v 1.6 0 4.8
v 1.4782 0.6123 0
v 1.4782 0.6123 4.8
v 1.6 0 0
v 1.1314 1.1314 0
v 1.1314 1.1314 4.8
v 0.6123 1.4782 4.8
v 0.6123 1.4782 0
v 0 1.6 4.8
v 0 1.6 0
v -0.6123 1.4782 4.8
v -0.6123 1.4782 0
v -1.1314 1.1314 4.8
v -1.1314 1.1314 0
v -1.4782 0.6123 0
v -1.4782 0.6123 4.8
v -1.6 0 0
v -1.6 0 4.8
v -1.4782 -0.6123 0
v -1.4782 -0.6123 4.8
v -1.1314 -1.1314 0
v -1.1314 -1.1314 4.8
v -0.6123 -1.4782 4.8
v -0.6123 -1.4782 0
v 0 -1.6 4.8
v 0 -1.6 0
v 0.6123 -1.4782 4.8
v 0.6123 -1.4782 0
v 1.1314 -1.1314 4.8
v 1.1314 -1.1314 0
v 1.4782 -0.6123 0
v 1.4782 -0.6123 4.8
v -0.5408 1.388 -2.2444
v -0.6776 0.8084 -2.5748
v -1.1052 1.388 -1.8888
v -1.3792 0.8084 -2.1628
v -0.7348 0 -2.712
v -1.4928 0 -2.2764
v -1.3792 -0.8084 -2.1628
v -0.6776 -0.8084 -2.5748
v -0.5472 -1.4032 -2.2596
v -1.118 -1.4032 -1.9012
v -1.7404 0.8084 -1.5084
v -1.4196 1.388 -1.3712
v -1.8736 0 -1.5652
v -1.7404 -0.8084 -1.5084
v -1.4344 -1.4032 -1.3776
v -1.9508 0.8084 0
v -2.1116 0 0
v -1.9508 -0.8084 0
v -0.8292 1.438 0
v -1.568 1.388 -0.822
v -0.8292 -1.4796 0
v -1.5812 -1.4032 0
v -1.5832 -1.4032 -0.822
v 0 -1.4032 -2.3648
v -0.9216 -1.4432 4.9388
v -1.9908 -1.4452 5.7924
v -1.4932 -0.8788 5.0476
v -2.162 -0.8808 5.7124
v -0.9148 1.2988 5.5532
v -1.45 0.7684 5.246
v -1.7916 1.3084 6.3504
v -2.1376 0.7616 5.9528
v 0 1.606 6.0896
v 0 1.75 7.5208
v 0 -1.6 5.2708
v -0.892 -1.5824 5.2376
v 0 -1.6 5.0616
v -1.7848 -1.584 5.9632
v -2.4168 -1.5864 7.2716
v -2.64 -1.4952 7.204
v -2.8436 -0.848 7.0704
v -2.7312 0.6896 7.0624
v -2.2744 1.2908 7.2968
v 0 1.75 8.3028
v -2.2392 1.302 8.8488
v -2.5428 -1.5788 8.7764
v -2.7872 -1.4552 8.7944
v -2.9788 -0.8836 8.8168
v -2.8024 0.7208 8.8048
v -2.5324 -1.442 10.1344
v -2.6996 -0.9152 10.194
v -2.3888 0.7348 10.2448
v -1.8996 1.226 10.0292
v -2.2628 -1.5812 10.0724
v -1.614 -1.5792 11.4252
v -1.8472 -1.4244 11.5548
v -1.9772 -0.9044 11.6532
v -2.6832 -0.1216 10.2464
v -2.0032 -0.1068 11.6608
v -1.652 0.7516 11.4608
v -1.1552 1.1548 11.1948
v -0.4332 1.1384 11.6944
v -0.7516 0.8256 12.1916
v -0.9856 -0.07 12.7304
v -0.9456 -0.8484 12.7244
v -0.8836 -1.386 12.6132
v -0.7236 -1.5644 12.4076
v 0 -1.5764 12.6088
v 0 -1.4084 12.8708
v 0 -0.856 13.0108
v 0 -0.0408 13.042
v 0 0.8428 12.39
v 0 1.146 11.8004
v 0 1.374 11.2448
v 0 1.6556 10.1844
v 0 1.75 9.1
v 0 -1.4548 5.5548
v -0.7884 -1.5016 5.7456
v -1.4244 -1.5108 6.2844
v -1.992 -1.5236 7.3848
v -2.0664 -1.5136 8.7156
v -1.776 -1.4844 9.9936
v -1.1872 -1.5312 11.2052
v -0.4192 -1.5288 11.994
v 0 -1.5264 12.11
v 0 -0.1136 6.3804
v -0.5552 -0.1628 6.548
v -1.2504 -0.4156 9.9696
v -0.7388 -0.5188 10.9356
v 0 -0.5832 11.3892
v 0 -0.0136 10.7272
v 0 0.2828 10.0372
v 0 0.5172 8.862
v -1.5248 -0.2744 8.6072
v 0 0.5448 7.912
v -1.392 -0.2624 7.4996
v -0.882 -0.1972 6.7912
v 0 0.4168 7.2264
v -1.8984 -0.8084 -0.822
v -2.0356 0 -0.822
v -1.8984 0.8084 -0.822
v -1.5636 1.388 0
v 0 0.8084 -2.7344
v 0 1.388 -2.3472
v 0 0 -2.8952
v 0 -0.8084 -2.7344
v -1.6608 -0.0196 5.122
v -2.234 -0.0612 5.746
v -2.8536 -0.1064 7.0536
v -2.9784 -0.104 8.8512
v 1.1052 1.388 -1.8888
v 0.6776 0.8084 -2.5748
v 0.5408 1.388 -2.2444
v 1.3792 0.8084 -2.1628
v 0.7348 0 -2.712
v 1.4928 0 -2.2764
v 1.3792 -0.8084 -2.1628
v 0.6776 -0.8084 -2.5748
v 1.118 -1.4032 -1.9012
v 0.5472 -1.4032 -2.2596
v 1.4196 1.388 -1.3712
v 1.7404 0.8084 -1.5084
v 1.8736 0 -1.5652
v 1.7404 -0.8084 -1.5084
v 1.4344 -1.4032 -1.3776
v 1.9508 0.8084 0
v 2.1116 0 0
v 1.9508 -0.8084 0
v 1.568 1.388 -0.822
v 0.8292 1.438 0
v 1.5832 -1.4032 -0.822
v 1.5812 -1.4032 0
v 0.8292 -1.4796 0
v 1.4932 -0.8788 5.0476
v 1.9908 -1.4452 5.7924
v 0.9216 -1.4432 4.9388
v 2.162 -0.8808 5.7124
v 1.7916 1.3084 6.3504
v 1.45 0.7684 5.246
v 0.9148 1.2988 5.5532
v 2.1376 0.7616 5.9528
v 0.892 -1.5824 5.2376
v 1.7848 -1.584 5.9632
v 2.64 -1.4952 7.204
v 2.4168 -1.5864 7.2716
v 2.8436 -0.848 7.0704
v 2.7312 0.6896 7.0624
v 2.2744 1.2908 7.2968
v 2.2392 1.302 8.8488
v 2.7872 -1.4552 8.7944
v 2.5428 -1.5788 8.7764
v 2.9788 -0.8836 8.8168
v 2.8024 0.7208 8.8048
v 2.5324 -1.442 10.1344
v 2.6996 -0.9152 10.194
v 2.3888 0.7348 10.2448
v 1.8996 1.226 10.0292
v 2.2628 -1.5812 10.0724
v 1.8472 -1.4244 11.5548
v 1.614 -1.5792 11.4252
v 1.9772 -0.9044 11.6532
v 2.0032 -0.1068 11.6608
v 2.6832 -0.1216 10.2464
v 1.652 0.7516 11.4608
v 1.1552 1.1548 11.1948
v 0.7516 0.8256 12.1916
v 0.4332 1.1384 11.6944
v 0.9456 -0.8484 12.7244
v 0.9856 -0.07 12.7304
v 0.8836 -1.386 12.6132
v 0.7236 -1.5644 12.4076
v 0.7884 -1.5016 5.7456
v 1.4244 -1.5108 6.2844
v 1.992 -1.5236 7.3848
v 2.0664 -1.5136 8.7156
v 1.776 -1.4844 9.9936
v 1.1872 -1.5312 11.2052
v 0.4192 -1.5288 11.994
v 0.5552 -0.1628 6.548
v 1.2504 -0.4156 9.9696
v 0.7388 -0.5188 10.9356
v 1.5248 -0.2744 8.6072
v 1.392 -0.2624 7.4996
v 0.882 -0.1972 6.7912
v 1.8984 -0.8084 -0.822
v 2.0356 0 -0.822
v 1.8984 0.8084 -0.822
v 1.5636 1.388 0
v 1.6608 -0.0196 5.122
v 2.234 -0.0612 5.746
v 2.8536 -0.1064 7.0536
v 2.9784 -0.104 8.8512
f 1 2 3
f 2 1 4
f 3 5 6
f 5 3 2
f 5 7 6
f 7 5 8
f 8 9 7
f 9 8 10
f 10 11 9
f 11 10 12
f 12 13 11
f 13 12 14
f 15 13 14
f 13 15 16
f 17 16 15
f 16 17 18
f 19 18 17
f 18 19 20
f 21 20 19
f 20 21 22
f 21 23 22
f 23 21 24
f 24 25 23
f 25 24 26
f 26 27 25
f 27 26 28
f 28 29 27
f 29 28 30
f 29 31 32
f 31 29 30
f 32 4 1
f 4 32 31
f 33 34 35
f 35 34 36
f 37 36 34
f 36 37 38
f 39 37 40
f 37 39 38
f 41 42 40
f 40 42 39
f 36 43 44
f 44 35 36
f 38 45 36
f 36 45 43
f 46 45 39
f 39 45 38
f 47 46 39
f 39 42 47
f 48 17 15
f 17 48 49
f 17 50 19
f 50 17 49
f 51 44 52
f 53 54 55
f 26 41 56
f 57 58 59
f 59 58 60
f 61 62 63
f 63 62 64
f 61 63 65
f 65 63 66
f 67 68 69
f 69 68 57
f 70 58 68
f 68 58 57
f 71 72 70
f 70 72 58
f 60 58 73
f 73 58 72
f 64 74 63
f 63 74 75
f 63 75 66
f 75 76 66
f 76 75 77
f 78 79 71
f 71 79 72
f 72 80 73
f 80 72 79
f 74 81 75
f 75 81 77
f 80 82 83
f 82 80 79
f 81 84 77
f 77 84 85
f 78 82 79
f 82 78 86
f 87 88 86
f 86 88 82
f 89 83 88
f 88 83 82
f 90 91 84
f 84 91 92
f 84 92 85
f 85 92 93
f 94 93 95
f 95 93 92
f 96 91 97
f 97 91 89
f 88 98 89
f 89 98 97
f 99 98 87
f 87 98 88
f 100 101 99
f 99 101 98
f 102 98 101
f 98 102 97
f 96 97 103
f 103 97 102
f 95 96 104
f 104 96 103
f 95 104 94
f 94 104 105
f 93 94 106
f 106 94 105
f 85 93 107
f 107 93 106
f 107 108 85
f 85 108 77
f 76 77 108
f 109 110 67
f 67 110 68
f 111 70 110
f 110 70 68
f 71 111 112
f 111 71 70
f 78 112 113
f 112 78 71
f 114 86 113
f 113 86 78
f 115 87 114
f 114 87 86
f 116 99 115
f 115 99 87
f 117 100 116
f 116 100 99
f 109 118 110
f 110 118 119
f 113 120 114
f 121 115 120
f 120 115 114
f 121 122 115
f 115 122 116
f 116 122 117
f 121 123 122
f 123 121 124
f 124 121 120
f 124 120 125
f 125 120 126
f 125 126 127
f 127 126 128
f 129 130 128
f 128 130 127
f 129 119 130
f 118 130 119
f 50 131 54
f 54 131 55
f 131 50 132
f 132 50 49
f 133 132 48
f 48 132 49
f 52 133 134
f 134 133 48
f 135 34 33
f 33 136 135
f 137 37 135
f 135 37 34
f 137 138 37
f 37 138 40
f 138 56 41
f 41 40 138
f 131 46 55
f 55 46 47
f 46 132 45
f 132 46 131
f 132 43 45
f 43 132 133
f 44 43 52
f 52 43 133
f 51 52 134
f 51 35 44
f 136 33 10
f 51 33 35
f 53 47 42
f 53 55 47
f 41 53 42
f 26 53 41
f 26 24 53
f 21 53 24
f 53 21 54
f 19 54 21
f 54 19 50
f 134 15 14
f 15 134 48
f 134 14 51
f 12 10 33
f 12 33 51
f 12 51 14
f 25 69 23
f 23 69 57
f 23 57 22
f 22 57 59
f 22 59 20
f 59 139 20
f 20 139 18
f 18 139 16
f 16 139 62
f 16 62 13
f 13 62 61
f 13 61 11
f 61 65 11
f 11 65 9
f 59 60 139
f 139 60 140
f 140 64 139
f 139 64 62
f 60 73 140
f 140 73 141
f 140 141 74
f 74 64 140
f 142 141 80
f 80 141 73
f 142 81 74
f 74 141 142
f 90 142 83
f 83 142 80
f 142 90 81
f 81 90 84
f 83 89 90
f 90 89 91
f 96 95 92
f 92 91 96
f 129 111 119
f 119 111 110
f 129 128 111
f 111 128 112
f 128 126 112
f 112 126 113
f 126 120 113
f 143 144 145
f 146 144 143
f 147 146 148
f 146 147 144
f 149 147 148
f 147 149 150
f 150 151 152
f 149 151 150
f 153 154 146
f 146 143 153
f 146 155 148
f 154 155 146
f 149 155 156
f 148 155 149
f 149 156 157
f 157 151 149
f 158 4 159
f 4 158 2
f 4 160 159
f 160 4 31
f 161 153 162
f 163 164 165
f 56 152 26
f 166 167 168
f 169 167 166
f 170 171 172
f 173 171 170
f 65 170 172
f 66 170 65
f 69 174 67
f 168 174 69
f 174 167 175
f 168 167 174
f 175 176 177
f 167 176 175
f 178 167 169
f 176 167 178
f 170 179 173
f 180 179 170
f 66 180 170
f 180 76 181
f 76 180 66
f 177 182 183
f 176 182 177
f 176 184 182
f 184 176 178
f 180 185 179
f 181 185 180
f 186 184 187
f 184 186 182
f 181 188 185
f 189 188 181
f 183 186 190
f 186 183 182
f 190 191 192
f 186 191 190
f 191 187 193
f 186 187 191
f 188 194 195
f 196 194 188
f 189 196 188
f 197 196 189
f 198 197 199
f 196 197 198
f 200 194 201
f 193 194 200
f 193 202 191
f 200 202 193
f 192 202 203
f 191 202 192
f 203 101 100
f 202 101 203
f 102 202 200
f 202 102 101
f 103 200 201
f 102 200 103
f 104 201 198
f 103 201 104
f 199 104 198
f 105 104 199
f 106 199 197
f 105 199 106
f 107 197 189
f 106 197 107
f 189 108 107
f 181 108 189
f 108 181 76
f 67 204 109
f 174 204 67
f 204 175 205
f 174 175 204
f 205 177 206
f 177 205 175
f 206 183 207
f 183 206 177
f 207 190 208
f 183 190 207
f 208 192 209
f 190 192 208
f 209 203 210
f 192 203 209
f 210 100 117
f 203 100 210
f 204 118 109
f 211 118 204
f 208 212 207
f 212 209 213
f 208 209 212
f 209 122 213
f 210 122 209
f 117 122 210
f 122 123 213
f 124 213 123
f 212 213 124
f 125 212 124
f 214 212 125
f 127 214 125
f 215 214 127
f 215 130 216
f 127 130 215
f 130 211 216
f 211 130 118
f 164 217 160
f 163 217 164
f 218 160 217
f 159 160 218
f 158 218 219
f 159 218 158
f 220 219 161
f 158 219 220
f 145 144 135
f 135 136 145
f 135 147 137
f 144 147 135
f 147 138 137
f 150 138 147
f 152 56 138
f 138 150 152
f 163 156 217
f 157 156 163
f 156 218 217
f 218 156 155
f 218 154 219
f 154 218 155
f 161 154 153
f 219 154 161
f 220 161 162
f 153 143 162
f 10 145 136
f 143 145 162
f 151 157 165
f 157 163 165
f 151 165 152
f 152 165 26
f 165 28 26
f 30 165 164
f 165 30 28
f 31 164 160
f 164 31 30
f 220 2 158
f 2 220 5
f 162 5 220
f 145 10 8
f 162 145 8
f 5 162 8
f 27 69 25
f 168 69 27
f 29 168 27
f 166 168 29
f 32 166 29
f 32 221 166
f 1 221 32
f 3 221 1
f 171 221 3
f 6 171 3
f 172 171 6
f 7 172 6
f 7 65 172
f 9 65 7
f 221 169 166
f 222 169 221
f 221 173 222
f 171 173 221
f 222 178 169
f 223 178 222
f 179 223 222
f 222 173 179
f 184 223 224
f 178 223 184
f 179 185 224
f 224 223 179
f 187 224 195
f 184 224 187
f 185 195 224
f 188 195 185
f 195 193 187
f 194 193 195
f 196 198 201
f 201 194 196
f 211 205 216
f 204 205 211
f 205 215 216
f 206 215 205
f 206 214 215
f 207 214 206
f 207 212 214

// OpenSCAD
use <../lib.scad>
use <../p/2-4edge.scad>
use <../p/4-4cyli.scad>
use <s/98393es01.scad>
function ldraw_lib__98393e() = [
// 0 Figure Friends Medical Spoon
// 0 Name: 98393e.dat
// 0 Author: Takeshi Takahashi [RainbowDolphin]
// 0 !LDRAW_ORG Part UPDATE 2024-10
// 0 !LICENSE Licensed under CC BY 4.0 : see CAreadme.txt
// 
// 0 BFC CERTIFY CCW
  [0,"BFC","CERTIFY"],
  [0,"BFC","CCW"],
// 
// 0 !CATEGORY Figure Accessory
// 0 !KEYWORDS Clinic, Hospital, Multipack 98393, rescue, Vet
// 
// 0 !HISTORY 2021-03-20 {LEGO/Unity Microgame} Original part shape
// 0 !HISTORY 2021-03-20 [RainbowDolphin] File preparation for LDraw Parts Tracker
// 0 !HISTORY 2024-12-01 [OrionP] Official Update 2024-10
// 
// 
// 1 16 0 0 0 4 0 0 0 -12 0 0 0 4 4-4cyli.dat
  [1,16,0,0,0,4,0,0,0,-12,0,0,0,4, ldraw_lib__4_4cyli()],
// 1 16 0 0 0 1 0 0 0 1 0 0 0 1 s\98393es01.dat
  [1,16,0,0,0,1,0,0,0,1,0,0,0,1, ldraw_lib__s__98393es01()],
// 1 16 0 0 0 -1 0 0 0 1 0 0 0 1 s\98393es01.dat
  [1,16,0,0,0,-1,0,0,0,1,0,0,0,1, ldraw_lib__s__98393es01()],
// 1 16 0 0 0 -4 0 0 0 1 0 0 0 -4 2-4edge.dat
  [1,16,0,0,0,-4,0,0,0,1,0,0,0,-4, ldraw_lib__2_4edge()],
// 
// 5 24 0 -13.177 -4 0 -13.887 -3.637 -1.971 -14.364 -3.754 1.971 -14.364 -3.754
  [5,24,0,-13.177,-4,0,-13.887,-3.637,-1.971,-14.364,-3.754,1.971,-14.364,-3.754],
// 5 24 0 -12.654 -4 0 -13.177 -4 -2.23 -13.094 -3.956 2.23 -13.094 -3.956
  [5,24,0,-12.654,-4,0,-13.177,-4,-2.23,-13.094,-3.956,2.23,-13.094,-3.956],
// 5 24 0 5.912 -3.508 0 0 -4 1.368 5.649 -3.508 -1.368 5.649 -3.508
  [5,24,0,5.912,-3.508,0,0,-4,1.368,5.649,-3.508,-1.368,5.649,-3.508],
// 5 24 0 -18.802 4.375 0 -15.224 4.015 -4.479 -15.876 3.271 4.479 -15.876 3.271
  [5,24,0,-18.802,4.375,0,-15.224,4.015,-4.479,-15.876,3.271,4.479,-15.876,3.271],
// 5 24 0 -31.522 -3.941 0 -32.177 -3.521 -1.809 -31.019 -3.911 1.809 -31.019 -3.911
  [5,24,0,-31.522,-3.941,0,-32.177,-3.521,-1.809,-31.019,-3.911,1.809,-31.019,-3.911],
// 5 24 0 -32.605 -.102 0 -30.975 2.107 -2.464 -31.826 -.175 2.464 -31.826 -.175
  [5,24,0,-32.605,-.102,0,-30.975,2.107,-2.464,-31.826,-.175,2.464,-31.826,-.175],
// 5 24 0 -28.473 -1.458 0 -30.275 -3.816 -1.048 -29.985 -3.822 1.048 -29.985 -3.822
  [5,24,0,-28.473,-1.458,0,-30.275,-3.816,-1.048,-29.985,-3.822,1.048,-29.985,-3.822],
// 5 24 0 7.238 0 0 6.836 -2.021 -1.837 6.78 0 1.837 6.78 0
  [5,24,0,7.238,0,0,6.836,-2.021,-1.837,6.78,0,1.837,6.78,0],
// 5 24 0 -12 4 1.5308 -12 3.6956 0 0 4 0 -15.224 4.015
  [5,24,0,-12,4,1.5308,-12,3.6956,0,0,4,0,-15.224,4.015],
// 5 24 -1.5308 0 3.6956 0 0 4 0 -12 4 -1.352 5.611 3.47
  [5,24,-1.5308,0,3.6956,0,0,4,0,-12,4,-1.352,5.611,3.47],
// 5 24 0 -20.757 4.375 0 -18.802 4.375 -5.686 -18.242 3.227 5.686 -18.242 3.227
  [5,24,0,-20.757,4.375,0,-18.802,4.375,-5.686,-18.242,3.227,5.686,-18.242,3.227],
// 5 24 -3.6956 -12 1.5308 -4 -12 0 -4.152 -12.805 -.049 -4 0 0
  [5,24,-3.6956,-12,1.5308,-4,-12,0,-4.152,-12.805,-.049,-4,0,0],
// 5 24 0 -12 4 -1.5308 -12 3.6956 -1.5308 0 3.6956 0 -15.224 4.015
  [5,24,0,-12,4,-1.5308,-12,3.6956,-1.5308,0,3.6956,0,-15.224,4.015],
// 5 24 0 -13.887 -3.637 0 -15.951 -.284 -1.971 -14.364 -3.754 1.971 -14.364 -3.754
  [5,24,0,-13.887,-3.637,0,-15.951,-.284,-1.971,-14.364,-3.754,1.971,-14.364,-3.754],
// 5 24 3.6956 -12 -1.5308 2.8284 -12 -2.8284 3.6956 0 -1.5308 3.733 -12.619 -2.197
  [5,24,3.6956,-12,-1.5308,2.8284,-12,-2.8284,3.6956,0,-1.5308,3.733,-12.619,-2.197],
// 5 24 0 -32.177 -3.521 0 -32.527 -2.14 -2.364 -31.811 -2.121 2.364 -31.811 -2.121
  [5,24,0,-32.177,-3.521,0,-32.527,-2.14,-2.364,-31.811,-2.121,2.364,-31.811,-2.121],
// 5 24 0 -32.527 -2.14 0 -32.605 -.102 2.364 -31.811 -2.121 -2.364 -31.811 -2.121
  [5,24,0,-32.527,-2.14,0,-32.605,-.102,2.364,-31.811,-2.121,-2.364,-31.811,-2.121],
// 5 24 0 -28.112 3.435 0 -25.461 4.139 2.888 -27.987 2.887 -2.888 -27.987 2.887
  [5,24,0,-28.112,3.435,0,-25.461,4.139,2.888,-27.987,2.887,-2.888,-27.987,2.887],
// 5 24 0 -25.093 .707 0 -26.818 -.034 -1.847 -27.339 -1.297 1.847 -27.339 -1.297
  [5,24,0,-25.093,.707,0,-26.818,-.034,-1.847,-27.339,-1.297,1.847,-27.339,-1.297],
// 5 24 0 -26.818 -.034 0 -28.473 -1.458 -1.847 -27.339 -1.297 1.847 -27.339 -1.297
  [5,24,0,-26.818,-.034,0,-28.473,-1.458,-1.847,-27.339,-1.297,1.847,-27.339,-1.297],
// 5 24 0 0 4 0 5.868 3.47 1.352 5.611 3.47 -1.352 5.611 3.47
  [5,24,0,0,4,0,5.868,3.47,1.352,5.611,3.47,-1.352,5.611,3.47],
// 5 24 1.5308 -12 3.6956 2.8284 -12 2.8284 1.5308 0 3.6956 2.287 -13.883 3.247
  [5,24,1.5308,-12,3.6956,2.8284,-12,2.8284,1.5308,0,3.6956,2.287,-13.883,3.247],
// 5 24 0 6.836 2.021 0 7.238 0 -1.837 6.78 0 1.837 6.78 0
  [5,24,0,6.836,2.021,0,7.238,0,-1.837,6.78,0,1.837,6.78,0],
// 5 24 0 -12 -4 0 -12.654 -4 1.5308 -12 -3.6956 -1.5308 -12 -3.6956
  [5,24,0,-12,-4,0,-12.654,-4,1.5308,-12,-3.6956,-1.5308,-12,-3.6956],
// 5 24 0 -22.155 1.293 0 -25.093 .707 3.126 -24.924 -1.039 -3.126 -24.924 -1.039
  [5,24,0,-22.155,1.293,0,-25.093,.707,3.126,-24.924,-1.039,-3.126,-24.924,-1.039],
// 5 24 0 -29.501 2.865 0 -28.112 3.435 -1.083 -29.236 2.846 1.083 -29.236 2.846
  [5,24,0,-29.501,2.865,0,-28.112,3.435,-1.083,-29.236,2.846,1.083,-29.236,2.846],
// 5 24 2.8284 -12 2.8284 3.6956 -12 1.5308 2.8284 0 2.8284 3.625 -13.115 1.921
  [5,24,2.8284,-12,2.8284,3.6956,-12,1.5308,2.8284,0,2.8284,3.625,-13.115,1.921],
// 5 24 0 -19.78 1.362 0 -22.155 1.293 -3.812 -21.518 -.686 3.812 -21.518 -.686
  [5,24,0,-19.78,1.362,0,-22.155,1.293,-3.812,-21.518,-.686,3.812,-21.518,-.686],
// 5 24 0 -30.975 2.107 0 -29.501 2.865 1.083 -29.236 2.846 -1.083 -29.236 2.846
  [5,24,0,-30.975,2.107,0,-29.501,2.865,1.083,-29.236,2.846,-1.083,-29.236,2.846],
// 5 24 -2.8284 -12 2.8284 -3.6956 -12 1.5308 -3.6956 0 1.5308 -3.625 -13.115 1.921
  [5,24,-2.8284,-12,2.8284,-3.6956,-12,1.5308,-3.6956,0,1.5308,-3.625,-13.115,1.921],
// 5 24 -1.5308 -12 3.6956 -2.8284 -12 2.8284 -2.8284 0 2.8284 -2.287 -13.883 3.247
  [5,24,-1.5308,-12,3.6956,-2.8284,-12,2.8284,-2.8284,0,2.8284,-2.287,-13.883,3.247],
// 5 24 0 -18.066 1.042 0 -19.78 1.362 -3.48 -18.749 -.656 3.48 -18.749 -.656
  [5,24,0,-18.066,1.042,0,-19.78,1.362,-3.48,-18.749,-.656,3.48,-18.749,-.656],
// 5 24 2.8284 -12 -2.8284 1.5308 -12 -3.6956 2.8284 0 -2.8284 2.304 -12.347 -3.608
  [5,24,2.8284,-12,-2.8284,1.5308,-12,-3.6956,2.8284,0,-2.8284,2.304,-12.347,-3.608],
// 5 24 -2.8284 -12 -2.8284 -1.5308 -12 -3.6956 -1.5308 0 -3.6956 -2.304 -12.347 -3.608
  [5,24,-2.8284,-12,-2.8284,-1.5308,-12,-3.6956,-1.5308,0,-3.6956,-2.304,-12.347,-3.608],
// 5 24 0 6.836 -2.021 0 5.912 -3.508 -1.694 6.437 -2.021 1.694 6.437 -2.021
  [5,24,0,6.836,-2.021,0,5.912,-3.508,-1.694,6.437,-2.021,1.694,6.437,-2.021],
// 5 24 4 -12 0 3.6956 -12 -1.5308 4.152 -12.805 -.049 4 0 0
  [5,24,4,-12,0,3.6956,-12,-1.5308,4.152,-12.805,-.049,4,0,0],
// 5 24 0 5.868 3.47 0 6.836 2.021 -1.694 6.437 2.021 1.694 6.437 2.021
  [5,24,0,5.868,3.47,0,6.836,2.021,-1.694,6.437,2.021,1.694,6.437,2.021],
// 5 24 0 -30.275 -3.816 0 -31.522 -3.941 -1.048 -29.985 -3.822 1.048 -29.985 -3.822
  [5,24,0,-30.275,-3.816,0,-31.522,-3.941,-1.048,-29.985,-3.822,1.048,-29.985,-3.822],
// 5 24 0 -15.224 4.015 0 -12 4 1.5308 -12 3.6956 -1.5308 -12 3.6956
  [5,24,0,-15.224,4.015,0,-12,4,1.5308,-12,3.6956,-1.5308,-12,3.6956],
// 5 24 -4 -12 0 -3.6956 -12 -1.5308 -4.152 -12.805 -.049 -3.6956 0 -1.5308
  [5,24,-4,-12,0,-3.6956,-12,-1.5308,-4.152,-12.805,-.049,-3.6956,0,-1.5308],
// 5 24 -3.6956 -12 -1.5308 -2.8284 -12 -2.8284 -3.733 -12.619 -2.197 -2.8284 0 -2.8284
  [5,24,-3.6956,-12,-1.5308,-2.8284,-12,-2.8284,-3.733,-12.619,-2.197,-2.8284,0,-2.8284],
// 5 24 0 -22.75 4.375 0 -20.757 4.375 -5.598 -22.122 3.255 5.598 -22.122 3.255
  [5,24,0,-22.75,4.375,0,-20.757,4.375,-5.598,-22.122,3.255,5.598,-22.122,3.255],
// 5 24 0 -25.461 4.139 0 -22.75 4.375 -4.749 -25.073 3.065 4.749 -25.073 3.065
  [5,24,0,-25.461,4.139,0,-22.75,4.375,-4.749,-25.073,3.065,4.749,-25.073,3.065],
// 5 24 1.5308 0 3.6956 0 0 4 1.352 5.611 3.47 1.5308 -12 3.6956
  [5,24,1.5308,0,3.6956,0,0,4,1.352,5.611,3.47,1.5308,-12,3.6956],
// 5 24 3.6956 -12 1.5308 4 -12 0 4.152 -12.805 -.049 3.6956 0 1.5308
  [5,24,3.6956,-12,1.5308,4,-12,0,4.152,-12.805,-.049,3.6956,0,1.5308],
// 5 24 0 -15.951 -.284 0 -18.066 1.042 -1.388 -16.37 -.407 1.388 -16.37 -.407
  [5,24,0,-15.951,-.284,0,-18.066,1.042,-1.388,-16.37,-.407,1.388,-16.37,-.407],
];
module ldraw_lib__98393e(step=0, col=false, unit=2/5, alt=false, line=0.2, solid=!$preview)
    makepoly(ldraw_lib__98393e(), step=step, col=col, unit=unit, alt=alt, line=line, solid=solid);
ldraw_lib__98393e(line=0.2);
